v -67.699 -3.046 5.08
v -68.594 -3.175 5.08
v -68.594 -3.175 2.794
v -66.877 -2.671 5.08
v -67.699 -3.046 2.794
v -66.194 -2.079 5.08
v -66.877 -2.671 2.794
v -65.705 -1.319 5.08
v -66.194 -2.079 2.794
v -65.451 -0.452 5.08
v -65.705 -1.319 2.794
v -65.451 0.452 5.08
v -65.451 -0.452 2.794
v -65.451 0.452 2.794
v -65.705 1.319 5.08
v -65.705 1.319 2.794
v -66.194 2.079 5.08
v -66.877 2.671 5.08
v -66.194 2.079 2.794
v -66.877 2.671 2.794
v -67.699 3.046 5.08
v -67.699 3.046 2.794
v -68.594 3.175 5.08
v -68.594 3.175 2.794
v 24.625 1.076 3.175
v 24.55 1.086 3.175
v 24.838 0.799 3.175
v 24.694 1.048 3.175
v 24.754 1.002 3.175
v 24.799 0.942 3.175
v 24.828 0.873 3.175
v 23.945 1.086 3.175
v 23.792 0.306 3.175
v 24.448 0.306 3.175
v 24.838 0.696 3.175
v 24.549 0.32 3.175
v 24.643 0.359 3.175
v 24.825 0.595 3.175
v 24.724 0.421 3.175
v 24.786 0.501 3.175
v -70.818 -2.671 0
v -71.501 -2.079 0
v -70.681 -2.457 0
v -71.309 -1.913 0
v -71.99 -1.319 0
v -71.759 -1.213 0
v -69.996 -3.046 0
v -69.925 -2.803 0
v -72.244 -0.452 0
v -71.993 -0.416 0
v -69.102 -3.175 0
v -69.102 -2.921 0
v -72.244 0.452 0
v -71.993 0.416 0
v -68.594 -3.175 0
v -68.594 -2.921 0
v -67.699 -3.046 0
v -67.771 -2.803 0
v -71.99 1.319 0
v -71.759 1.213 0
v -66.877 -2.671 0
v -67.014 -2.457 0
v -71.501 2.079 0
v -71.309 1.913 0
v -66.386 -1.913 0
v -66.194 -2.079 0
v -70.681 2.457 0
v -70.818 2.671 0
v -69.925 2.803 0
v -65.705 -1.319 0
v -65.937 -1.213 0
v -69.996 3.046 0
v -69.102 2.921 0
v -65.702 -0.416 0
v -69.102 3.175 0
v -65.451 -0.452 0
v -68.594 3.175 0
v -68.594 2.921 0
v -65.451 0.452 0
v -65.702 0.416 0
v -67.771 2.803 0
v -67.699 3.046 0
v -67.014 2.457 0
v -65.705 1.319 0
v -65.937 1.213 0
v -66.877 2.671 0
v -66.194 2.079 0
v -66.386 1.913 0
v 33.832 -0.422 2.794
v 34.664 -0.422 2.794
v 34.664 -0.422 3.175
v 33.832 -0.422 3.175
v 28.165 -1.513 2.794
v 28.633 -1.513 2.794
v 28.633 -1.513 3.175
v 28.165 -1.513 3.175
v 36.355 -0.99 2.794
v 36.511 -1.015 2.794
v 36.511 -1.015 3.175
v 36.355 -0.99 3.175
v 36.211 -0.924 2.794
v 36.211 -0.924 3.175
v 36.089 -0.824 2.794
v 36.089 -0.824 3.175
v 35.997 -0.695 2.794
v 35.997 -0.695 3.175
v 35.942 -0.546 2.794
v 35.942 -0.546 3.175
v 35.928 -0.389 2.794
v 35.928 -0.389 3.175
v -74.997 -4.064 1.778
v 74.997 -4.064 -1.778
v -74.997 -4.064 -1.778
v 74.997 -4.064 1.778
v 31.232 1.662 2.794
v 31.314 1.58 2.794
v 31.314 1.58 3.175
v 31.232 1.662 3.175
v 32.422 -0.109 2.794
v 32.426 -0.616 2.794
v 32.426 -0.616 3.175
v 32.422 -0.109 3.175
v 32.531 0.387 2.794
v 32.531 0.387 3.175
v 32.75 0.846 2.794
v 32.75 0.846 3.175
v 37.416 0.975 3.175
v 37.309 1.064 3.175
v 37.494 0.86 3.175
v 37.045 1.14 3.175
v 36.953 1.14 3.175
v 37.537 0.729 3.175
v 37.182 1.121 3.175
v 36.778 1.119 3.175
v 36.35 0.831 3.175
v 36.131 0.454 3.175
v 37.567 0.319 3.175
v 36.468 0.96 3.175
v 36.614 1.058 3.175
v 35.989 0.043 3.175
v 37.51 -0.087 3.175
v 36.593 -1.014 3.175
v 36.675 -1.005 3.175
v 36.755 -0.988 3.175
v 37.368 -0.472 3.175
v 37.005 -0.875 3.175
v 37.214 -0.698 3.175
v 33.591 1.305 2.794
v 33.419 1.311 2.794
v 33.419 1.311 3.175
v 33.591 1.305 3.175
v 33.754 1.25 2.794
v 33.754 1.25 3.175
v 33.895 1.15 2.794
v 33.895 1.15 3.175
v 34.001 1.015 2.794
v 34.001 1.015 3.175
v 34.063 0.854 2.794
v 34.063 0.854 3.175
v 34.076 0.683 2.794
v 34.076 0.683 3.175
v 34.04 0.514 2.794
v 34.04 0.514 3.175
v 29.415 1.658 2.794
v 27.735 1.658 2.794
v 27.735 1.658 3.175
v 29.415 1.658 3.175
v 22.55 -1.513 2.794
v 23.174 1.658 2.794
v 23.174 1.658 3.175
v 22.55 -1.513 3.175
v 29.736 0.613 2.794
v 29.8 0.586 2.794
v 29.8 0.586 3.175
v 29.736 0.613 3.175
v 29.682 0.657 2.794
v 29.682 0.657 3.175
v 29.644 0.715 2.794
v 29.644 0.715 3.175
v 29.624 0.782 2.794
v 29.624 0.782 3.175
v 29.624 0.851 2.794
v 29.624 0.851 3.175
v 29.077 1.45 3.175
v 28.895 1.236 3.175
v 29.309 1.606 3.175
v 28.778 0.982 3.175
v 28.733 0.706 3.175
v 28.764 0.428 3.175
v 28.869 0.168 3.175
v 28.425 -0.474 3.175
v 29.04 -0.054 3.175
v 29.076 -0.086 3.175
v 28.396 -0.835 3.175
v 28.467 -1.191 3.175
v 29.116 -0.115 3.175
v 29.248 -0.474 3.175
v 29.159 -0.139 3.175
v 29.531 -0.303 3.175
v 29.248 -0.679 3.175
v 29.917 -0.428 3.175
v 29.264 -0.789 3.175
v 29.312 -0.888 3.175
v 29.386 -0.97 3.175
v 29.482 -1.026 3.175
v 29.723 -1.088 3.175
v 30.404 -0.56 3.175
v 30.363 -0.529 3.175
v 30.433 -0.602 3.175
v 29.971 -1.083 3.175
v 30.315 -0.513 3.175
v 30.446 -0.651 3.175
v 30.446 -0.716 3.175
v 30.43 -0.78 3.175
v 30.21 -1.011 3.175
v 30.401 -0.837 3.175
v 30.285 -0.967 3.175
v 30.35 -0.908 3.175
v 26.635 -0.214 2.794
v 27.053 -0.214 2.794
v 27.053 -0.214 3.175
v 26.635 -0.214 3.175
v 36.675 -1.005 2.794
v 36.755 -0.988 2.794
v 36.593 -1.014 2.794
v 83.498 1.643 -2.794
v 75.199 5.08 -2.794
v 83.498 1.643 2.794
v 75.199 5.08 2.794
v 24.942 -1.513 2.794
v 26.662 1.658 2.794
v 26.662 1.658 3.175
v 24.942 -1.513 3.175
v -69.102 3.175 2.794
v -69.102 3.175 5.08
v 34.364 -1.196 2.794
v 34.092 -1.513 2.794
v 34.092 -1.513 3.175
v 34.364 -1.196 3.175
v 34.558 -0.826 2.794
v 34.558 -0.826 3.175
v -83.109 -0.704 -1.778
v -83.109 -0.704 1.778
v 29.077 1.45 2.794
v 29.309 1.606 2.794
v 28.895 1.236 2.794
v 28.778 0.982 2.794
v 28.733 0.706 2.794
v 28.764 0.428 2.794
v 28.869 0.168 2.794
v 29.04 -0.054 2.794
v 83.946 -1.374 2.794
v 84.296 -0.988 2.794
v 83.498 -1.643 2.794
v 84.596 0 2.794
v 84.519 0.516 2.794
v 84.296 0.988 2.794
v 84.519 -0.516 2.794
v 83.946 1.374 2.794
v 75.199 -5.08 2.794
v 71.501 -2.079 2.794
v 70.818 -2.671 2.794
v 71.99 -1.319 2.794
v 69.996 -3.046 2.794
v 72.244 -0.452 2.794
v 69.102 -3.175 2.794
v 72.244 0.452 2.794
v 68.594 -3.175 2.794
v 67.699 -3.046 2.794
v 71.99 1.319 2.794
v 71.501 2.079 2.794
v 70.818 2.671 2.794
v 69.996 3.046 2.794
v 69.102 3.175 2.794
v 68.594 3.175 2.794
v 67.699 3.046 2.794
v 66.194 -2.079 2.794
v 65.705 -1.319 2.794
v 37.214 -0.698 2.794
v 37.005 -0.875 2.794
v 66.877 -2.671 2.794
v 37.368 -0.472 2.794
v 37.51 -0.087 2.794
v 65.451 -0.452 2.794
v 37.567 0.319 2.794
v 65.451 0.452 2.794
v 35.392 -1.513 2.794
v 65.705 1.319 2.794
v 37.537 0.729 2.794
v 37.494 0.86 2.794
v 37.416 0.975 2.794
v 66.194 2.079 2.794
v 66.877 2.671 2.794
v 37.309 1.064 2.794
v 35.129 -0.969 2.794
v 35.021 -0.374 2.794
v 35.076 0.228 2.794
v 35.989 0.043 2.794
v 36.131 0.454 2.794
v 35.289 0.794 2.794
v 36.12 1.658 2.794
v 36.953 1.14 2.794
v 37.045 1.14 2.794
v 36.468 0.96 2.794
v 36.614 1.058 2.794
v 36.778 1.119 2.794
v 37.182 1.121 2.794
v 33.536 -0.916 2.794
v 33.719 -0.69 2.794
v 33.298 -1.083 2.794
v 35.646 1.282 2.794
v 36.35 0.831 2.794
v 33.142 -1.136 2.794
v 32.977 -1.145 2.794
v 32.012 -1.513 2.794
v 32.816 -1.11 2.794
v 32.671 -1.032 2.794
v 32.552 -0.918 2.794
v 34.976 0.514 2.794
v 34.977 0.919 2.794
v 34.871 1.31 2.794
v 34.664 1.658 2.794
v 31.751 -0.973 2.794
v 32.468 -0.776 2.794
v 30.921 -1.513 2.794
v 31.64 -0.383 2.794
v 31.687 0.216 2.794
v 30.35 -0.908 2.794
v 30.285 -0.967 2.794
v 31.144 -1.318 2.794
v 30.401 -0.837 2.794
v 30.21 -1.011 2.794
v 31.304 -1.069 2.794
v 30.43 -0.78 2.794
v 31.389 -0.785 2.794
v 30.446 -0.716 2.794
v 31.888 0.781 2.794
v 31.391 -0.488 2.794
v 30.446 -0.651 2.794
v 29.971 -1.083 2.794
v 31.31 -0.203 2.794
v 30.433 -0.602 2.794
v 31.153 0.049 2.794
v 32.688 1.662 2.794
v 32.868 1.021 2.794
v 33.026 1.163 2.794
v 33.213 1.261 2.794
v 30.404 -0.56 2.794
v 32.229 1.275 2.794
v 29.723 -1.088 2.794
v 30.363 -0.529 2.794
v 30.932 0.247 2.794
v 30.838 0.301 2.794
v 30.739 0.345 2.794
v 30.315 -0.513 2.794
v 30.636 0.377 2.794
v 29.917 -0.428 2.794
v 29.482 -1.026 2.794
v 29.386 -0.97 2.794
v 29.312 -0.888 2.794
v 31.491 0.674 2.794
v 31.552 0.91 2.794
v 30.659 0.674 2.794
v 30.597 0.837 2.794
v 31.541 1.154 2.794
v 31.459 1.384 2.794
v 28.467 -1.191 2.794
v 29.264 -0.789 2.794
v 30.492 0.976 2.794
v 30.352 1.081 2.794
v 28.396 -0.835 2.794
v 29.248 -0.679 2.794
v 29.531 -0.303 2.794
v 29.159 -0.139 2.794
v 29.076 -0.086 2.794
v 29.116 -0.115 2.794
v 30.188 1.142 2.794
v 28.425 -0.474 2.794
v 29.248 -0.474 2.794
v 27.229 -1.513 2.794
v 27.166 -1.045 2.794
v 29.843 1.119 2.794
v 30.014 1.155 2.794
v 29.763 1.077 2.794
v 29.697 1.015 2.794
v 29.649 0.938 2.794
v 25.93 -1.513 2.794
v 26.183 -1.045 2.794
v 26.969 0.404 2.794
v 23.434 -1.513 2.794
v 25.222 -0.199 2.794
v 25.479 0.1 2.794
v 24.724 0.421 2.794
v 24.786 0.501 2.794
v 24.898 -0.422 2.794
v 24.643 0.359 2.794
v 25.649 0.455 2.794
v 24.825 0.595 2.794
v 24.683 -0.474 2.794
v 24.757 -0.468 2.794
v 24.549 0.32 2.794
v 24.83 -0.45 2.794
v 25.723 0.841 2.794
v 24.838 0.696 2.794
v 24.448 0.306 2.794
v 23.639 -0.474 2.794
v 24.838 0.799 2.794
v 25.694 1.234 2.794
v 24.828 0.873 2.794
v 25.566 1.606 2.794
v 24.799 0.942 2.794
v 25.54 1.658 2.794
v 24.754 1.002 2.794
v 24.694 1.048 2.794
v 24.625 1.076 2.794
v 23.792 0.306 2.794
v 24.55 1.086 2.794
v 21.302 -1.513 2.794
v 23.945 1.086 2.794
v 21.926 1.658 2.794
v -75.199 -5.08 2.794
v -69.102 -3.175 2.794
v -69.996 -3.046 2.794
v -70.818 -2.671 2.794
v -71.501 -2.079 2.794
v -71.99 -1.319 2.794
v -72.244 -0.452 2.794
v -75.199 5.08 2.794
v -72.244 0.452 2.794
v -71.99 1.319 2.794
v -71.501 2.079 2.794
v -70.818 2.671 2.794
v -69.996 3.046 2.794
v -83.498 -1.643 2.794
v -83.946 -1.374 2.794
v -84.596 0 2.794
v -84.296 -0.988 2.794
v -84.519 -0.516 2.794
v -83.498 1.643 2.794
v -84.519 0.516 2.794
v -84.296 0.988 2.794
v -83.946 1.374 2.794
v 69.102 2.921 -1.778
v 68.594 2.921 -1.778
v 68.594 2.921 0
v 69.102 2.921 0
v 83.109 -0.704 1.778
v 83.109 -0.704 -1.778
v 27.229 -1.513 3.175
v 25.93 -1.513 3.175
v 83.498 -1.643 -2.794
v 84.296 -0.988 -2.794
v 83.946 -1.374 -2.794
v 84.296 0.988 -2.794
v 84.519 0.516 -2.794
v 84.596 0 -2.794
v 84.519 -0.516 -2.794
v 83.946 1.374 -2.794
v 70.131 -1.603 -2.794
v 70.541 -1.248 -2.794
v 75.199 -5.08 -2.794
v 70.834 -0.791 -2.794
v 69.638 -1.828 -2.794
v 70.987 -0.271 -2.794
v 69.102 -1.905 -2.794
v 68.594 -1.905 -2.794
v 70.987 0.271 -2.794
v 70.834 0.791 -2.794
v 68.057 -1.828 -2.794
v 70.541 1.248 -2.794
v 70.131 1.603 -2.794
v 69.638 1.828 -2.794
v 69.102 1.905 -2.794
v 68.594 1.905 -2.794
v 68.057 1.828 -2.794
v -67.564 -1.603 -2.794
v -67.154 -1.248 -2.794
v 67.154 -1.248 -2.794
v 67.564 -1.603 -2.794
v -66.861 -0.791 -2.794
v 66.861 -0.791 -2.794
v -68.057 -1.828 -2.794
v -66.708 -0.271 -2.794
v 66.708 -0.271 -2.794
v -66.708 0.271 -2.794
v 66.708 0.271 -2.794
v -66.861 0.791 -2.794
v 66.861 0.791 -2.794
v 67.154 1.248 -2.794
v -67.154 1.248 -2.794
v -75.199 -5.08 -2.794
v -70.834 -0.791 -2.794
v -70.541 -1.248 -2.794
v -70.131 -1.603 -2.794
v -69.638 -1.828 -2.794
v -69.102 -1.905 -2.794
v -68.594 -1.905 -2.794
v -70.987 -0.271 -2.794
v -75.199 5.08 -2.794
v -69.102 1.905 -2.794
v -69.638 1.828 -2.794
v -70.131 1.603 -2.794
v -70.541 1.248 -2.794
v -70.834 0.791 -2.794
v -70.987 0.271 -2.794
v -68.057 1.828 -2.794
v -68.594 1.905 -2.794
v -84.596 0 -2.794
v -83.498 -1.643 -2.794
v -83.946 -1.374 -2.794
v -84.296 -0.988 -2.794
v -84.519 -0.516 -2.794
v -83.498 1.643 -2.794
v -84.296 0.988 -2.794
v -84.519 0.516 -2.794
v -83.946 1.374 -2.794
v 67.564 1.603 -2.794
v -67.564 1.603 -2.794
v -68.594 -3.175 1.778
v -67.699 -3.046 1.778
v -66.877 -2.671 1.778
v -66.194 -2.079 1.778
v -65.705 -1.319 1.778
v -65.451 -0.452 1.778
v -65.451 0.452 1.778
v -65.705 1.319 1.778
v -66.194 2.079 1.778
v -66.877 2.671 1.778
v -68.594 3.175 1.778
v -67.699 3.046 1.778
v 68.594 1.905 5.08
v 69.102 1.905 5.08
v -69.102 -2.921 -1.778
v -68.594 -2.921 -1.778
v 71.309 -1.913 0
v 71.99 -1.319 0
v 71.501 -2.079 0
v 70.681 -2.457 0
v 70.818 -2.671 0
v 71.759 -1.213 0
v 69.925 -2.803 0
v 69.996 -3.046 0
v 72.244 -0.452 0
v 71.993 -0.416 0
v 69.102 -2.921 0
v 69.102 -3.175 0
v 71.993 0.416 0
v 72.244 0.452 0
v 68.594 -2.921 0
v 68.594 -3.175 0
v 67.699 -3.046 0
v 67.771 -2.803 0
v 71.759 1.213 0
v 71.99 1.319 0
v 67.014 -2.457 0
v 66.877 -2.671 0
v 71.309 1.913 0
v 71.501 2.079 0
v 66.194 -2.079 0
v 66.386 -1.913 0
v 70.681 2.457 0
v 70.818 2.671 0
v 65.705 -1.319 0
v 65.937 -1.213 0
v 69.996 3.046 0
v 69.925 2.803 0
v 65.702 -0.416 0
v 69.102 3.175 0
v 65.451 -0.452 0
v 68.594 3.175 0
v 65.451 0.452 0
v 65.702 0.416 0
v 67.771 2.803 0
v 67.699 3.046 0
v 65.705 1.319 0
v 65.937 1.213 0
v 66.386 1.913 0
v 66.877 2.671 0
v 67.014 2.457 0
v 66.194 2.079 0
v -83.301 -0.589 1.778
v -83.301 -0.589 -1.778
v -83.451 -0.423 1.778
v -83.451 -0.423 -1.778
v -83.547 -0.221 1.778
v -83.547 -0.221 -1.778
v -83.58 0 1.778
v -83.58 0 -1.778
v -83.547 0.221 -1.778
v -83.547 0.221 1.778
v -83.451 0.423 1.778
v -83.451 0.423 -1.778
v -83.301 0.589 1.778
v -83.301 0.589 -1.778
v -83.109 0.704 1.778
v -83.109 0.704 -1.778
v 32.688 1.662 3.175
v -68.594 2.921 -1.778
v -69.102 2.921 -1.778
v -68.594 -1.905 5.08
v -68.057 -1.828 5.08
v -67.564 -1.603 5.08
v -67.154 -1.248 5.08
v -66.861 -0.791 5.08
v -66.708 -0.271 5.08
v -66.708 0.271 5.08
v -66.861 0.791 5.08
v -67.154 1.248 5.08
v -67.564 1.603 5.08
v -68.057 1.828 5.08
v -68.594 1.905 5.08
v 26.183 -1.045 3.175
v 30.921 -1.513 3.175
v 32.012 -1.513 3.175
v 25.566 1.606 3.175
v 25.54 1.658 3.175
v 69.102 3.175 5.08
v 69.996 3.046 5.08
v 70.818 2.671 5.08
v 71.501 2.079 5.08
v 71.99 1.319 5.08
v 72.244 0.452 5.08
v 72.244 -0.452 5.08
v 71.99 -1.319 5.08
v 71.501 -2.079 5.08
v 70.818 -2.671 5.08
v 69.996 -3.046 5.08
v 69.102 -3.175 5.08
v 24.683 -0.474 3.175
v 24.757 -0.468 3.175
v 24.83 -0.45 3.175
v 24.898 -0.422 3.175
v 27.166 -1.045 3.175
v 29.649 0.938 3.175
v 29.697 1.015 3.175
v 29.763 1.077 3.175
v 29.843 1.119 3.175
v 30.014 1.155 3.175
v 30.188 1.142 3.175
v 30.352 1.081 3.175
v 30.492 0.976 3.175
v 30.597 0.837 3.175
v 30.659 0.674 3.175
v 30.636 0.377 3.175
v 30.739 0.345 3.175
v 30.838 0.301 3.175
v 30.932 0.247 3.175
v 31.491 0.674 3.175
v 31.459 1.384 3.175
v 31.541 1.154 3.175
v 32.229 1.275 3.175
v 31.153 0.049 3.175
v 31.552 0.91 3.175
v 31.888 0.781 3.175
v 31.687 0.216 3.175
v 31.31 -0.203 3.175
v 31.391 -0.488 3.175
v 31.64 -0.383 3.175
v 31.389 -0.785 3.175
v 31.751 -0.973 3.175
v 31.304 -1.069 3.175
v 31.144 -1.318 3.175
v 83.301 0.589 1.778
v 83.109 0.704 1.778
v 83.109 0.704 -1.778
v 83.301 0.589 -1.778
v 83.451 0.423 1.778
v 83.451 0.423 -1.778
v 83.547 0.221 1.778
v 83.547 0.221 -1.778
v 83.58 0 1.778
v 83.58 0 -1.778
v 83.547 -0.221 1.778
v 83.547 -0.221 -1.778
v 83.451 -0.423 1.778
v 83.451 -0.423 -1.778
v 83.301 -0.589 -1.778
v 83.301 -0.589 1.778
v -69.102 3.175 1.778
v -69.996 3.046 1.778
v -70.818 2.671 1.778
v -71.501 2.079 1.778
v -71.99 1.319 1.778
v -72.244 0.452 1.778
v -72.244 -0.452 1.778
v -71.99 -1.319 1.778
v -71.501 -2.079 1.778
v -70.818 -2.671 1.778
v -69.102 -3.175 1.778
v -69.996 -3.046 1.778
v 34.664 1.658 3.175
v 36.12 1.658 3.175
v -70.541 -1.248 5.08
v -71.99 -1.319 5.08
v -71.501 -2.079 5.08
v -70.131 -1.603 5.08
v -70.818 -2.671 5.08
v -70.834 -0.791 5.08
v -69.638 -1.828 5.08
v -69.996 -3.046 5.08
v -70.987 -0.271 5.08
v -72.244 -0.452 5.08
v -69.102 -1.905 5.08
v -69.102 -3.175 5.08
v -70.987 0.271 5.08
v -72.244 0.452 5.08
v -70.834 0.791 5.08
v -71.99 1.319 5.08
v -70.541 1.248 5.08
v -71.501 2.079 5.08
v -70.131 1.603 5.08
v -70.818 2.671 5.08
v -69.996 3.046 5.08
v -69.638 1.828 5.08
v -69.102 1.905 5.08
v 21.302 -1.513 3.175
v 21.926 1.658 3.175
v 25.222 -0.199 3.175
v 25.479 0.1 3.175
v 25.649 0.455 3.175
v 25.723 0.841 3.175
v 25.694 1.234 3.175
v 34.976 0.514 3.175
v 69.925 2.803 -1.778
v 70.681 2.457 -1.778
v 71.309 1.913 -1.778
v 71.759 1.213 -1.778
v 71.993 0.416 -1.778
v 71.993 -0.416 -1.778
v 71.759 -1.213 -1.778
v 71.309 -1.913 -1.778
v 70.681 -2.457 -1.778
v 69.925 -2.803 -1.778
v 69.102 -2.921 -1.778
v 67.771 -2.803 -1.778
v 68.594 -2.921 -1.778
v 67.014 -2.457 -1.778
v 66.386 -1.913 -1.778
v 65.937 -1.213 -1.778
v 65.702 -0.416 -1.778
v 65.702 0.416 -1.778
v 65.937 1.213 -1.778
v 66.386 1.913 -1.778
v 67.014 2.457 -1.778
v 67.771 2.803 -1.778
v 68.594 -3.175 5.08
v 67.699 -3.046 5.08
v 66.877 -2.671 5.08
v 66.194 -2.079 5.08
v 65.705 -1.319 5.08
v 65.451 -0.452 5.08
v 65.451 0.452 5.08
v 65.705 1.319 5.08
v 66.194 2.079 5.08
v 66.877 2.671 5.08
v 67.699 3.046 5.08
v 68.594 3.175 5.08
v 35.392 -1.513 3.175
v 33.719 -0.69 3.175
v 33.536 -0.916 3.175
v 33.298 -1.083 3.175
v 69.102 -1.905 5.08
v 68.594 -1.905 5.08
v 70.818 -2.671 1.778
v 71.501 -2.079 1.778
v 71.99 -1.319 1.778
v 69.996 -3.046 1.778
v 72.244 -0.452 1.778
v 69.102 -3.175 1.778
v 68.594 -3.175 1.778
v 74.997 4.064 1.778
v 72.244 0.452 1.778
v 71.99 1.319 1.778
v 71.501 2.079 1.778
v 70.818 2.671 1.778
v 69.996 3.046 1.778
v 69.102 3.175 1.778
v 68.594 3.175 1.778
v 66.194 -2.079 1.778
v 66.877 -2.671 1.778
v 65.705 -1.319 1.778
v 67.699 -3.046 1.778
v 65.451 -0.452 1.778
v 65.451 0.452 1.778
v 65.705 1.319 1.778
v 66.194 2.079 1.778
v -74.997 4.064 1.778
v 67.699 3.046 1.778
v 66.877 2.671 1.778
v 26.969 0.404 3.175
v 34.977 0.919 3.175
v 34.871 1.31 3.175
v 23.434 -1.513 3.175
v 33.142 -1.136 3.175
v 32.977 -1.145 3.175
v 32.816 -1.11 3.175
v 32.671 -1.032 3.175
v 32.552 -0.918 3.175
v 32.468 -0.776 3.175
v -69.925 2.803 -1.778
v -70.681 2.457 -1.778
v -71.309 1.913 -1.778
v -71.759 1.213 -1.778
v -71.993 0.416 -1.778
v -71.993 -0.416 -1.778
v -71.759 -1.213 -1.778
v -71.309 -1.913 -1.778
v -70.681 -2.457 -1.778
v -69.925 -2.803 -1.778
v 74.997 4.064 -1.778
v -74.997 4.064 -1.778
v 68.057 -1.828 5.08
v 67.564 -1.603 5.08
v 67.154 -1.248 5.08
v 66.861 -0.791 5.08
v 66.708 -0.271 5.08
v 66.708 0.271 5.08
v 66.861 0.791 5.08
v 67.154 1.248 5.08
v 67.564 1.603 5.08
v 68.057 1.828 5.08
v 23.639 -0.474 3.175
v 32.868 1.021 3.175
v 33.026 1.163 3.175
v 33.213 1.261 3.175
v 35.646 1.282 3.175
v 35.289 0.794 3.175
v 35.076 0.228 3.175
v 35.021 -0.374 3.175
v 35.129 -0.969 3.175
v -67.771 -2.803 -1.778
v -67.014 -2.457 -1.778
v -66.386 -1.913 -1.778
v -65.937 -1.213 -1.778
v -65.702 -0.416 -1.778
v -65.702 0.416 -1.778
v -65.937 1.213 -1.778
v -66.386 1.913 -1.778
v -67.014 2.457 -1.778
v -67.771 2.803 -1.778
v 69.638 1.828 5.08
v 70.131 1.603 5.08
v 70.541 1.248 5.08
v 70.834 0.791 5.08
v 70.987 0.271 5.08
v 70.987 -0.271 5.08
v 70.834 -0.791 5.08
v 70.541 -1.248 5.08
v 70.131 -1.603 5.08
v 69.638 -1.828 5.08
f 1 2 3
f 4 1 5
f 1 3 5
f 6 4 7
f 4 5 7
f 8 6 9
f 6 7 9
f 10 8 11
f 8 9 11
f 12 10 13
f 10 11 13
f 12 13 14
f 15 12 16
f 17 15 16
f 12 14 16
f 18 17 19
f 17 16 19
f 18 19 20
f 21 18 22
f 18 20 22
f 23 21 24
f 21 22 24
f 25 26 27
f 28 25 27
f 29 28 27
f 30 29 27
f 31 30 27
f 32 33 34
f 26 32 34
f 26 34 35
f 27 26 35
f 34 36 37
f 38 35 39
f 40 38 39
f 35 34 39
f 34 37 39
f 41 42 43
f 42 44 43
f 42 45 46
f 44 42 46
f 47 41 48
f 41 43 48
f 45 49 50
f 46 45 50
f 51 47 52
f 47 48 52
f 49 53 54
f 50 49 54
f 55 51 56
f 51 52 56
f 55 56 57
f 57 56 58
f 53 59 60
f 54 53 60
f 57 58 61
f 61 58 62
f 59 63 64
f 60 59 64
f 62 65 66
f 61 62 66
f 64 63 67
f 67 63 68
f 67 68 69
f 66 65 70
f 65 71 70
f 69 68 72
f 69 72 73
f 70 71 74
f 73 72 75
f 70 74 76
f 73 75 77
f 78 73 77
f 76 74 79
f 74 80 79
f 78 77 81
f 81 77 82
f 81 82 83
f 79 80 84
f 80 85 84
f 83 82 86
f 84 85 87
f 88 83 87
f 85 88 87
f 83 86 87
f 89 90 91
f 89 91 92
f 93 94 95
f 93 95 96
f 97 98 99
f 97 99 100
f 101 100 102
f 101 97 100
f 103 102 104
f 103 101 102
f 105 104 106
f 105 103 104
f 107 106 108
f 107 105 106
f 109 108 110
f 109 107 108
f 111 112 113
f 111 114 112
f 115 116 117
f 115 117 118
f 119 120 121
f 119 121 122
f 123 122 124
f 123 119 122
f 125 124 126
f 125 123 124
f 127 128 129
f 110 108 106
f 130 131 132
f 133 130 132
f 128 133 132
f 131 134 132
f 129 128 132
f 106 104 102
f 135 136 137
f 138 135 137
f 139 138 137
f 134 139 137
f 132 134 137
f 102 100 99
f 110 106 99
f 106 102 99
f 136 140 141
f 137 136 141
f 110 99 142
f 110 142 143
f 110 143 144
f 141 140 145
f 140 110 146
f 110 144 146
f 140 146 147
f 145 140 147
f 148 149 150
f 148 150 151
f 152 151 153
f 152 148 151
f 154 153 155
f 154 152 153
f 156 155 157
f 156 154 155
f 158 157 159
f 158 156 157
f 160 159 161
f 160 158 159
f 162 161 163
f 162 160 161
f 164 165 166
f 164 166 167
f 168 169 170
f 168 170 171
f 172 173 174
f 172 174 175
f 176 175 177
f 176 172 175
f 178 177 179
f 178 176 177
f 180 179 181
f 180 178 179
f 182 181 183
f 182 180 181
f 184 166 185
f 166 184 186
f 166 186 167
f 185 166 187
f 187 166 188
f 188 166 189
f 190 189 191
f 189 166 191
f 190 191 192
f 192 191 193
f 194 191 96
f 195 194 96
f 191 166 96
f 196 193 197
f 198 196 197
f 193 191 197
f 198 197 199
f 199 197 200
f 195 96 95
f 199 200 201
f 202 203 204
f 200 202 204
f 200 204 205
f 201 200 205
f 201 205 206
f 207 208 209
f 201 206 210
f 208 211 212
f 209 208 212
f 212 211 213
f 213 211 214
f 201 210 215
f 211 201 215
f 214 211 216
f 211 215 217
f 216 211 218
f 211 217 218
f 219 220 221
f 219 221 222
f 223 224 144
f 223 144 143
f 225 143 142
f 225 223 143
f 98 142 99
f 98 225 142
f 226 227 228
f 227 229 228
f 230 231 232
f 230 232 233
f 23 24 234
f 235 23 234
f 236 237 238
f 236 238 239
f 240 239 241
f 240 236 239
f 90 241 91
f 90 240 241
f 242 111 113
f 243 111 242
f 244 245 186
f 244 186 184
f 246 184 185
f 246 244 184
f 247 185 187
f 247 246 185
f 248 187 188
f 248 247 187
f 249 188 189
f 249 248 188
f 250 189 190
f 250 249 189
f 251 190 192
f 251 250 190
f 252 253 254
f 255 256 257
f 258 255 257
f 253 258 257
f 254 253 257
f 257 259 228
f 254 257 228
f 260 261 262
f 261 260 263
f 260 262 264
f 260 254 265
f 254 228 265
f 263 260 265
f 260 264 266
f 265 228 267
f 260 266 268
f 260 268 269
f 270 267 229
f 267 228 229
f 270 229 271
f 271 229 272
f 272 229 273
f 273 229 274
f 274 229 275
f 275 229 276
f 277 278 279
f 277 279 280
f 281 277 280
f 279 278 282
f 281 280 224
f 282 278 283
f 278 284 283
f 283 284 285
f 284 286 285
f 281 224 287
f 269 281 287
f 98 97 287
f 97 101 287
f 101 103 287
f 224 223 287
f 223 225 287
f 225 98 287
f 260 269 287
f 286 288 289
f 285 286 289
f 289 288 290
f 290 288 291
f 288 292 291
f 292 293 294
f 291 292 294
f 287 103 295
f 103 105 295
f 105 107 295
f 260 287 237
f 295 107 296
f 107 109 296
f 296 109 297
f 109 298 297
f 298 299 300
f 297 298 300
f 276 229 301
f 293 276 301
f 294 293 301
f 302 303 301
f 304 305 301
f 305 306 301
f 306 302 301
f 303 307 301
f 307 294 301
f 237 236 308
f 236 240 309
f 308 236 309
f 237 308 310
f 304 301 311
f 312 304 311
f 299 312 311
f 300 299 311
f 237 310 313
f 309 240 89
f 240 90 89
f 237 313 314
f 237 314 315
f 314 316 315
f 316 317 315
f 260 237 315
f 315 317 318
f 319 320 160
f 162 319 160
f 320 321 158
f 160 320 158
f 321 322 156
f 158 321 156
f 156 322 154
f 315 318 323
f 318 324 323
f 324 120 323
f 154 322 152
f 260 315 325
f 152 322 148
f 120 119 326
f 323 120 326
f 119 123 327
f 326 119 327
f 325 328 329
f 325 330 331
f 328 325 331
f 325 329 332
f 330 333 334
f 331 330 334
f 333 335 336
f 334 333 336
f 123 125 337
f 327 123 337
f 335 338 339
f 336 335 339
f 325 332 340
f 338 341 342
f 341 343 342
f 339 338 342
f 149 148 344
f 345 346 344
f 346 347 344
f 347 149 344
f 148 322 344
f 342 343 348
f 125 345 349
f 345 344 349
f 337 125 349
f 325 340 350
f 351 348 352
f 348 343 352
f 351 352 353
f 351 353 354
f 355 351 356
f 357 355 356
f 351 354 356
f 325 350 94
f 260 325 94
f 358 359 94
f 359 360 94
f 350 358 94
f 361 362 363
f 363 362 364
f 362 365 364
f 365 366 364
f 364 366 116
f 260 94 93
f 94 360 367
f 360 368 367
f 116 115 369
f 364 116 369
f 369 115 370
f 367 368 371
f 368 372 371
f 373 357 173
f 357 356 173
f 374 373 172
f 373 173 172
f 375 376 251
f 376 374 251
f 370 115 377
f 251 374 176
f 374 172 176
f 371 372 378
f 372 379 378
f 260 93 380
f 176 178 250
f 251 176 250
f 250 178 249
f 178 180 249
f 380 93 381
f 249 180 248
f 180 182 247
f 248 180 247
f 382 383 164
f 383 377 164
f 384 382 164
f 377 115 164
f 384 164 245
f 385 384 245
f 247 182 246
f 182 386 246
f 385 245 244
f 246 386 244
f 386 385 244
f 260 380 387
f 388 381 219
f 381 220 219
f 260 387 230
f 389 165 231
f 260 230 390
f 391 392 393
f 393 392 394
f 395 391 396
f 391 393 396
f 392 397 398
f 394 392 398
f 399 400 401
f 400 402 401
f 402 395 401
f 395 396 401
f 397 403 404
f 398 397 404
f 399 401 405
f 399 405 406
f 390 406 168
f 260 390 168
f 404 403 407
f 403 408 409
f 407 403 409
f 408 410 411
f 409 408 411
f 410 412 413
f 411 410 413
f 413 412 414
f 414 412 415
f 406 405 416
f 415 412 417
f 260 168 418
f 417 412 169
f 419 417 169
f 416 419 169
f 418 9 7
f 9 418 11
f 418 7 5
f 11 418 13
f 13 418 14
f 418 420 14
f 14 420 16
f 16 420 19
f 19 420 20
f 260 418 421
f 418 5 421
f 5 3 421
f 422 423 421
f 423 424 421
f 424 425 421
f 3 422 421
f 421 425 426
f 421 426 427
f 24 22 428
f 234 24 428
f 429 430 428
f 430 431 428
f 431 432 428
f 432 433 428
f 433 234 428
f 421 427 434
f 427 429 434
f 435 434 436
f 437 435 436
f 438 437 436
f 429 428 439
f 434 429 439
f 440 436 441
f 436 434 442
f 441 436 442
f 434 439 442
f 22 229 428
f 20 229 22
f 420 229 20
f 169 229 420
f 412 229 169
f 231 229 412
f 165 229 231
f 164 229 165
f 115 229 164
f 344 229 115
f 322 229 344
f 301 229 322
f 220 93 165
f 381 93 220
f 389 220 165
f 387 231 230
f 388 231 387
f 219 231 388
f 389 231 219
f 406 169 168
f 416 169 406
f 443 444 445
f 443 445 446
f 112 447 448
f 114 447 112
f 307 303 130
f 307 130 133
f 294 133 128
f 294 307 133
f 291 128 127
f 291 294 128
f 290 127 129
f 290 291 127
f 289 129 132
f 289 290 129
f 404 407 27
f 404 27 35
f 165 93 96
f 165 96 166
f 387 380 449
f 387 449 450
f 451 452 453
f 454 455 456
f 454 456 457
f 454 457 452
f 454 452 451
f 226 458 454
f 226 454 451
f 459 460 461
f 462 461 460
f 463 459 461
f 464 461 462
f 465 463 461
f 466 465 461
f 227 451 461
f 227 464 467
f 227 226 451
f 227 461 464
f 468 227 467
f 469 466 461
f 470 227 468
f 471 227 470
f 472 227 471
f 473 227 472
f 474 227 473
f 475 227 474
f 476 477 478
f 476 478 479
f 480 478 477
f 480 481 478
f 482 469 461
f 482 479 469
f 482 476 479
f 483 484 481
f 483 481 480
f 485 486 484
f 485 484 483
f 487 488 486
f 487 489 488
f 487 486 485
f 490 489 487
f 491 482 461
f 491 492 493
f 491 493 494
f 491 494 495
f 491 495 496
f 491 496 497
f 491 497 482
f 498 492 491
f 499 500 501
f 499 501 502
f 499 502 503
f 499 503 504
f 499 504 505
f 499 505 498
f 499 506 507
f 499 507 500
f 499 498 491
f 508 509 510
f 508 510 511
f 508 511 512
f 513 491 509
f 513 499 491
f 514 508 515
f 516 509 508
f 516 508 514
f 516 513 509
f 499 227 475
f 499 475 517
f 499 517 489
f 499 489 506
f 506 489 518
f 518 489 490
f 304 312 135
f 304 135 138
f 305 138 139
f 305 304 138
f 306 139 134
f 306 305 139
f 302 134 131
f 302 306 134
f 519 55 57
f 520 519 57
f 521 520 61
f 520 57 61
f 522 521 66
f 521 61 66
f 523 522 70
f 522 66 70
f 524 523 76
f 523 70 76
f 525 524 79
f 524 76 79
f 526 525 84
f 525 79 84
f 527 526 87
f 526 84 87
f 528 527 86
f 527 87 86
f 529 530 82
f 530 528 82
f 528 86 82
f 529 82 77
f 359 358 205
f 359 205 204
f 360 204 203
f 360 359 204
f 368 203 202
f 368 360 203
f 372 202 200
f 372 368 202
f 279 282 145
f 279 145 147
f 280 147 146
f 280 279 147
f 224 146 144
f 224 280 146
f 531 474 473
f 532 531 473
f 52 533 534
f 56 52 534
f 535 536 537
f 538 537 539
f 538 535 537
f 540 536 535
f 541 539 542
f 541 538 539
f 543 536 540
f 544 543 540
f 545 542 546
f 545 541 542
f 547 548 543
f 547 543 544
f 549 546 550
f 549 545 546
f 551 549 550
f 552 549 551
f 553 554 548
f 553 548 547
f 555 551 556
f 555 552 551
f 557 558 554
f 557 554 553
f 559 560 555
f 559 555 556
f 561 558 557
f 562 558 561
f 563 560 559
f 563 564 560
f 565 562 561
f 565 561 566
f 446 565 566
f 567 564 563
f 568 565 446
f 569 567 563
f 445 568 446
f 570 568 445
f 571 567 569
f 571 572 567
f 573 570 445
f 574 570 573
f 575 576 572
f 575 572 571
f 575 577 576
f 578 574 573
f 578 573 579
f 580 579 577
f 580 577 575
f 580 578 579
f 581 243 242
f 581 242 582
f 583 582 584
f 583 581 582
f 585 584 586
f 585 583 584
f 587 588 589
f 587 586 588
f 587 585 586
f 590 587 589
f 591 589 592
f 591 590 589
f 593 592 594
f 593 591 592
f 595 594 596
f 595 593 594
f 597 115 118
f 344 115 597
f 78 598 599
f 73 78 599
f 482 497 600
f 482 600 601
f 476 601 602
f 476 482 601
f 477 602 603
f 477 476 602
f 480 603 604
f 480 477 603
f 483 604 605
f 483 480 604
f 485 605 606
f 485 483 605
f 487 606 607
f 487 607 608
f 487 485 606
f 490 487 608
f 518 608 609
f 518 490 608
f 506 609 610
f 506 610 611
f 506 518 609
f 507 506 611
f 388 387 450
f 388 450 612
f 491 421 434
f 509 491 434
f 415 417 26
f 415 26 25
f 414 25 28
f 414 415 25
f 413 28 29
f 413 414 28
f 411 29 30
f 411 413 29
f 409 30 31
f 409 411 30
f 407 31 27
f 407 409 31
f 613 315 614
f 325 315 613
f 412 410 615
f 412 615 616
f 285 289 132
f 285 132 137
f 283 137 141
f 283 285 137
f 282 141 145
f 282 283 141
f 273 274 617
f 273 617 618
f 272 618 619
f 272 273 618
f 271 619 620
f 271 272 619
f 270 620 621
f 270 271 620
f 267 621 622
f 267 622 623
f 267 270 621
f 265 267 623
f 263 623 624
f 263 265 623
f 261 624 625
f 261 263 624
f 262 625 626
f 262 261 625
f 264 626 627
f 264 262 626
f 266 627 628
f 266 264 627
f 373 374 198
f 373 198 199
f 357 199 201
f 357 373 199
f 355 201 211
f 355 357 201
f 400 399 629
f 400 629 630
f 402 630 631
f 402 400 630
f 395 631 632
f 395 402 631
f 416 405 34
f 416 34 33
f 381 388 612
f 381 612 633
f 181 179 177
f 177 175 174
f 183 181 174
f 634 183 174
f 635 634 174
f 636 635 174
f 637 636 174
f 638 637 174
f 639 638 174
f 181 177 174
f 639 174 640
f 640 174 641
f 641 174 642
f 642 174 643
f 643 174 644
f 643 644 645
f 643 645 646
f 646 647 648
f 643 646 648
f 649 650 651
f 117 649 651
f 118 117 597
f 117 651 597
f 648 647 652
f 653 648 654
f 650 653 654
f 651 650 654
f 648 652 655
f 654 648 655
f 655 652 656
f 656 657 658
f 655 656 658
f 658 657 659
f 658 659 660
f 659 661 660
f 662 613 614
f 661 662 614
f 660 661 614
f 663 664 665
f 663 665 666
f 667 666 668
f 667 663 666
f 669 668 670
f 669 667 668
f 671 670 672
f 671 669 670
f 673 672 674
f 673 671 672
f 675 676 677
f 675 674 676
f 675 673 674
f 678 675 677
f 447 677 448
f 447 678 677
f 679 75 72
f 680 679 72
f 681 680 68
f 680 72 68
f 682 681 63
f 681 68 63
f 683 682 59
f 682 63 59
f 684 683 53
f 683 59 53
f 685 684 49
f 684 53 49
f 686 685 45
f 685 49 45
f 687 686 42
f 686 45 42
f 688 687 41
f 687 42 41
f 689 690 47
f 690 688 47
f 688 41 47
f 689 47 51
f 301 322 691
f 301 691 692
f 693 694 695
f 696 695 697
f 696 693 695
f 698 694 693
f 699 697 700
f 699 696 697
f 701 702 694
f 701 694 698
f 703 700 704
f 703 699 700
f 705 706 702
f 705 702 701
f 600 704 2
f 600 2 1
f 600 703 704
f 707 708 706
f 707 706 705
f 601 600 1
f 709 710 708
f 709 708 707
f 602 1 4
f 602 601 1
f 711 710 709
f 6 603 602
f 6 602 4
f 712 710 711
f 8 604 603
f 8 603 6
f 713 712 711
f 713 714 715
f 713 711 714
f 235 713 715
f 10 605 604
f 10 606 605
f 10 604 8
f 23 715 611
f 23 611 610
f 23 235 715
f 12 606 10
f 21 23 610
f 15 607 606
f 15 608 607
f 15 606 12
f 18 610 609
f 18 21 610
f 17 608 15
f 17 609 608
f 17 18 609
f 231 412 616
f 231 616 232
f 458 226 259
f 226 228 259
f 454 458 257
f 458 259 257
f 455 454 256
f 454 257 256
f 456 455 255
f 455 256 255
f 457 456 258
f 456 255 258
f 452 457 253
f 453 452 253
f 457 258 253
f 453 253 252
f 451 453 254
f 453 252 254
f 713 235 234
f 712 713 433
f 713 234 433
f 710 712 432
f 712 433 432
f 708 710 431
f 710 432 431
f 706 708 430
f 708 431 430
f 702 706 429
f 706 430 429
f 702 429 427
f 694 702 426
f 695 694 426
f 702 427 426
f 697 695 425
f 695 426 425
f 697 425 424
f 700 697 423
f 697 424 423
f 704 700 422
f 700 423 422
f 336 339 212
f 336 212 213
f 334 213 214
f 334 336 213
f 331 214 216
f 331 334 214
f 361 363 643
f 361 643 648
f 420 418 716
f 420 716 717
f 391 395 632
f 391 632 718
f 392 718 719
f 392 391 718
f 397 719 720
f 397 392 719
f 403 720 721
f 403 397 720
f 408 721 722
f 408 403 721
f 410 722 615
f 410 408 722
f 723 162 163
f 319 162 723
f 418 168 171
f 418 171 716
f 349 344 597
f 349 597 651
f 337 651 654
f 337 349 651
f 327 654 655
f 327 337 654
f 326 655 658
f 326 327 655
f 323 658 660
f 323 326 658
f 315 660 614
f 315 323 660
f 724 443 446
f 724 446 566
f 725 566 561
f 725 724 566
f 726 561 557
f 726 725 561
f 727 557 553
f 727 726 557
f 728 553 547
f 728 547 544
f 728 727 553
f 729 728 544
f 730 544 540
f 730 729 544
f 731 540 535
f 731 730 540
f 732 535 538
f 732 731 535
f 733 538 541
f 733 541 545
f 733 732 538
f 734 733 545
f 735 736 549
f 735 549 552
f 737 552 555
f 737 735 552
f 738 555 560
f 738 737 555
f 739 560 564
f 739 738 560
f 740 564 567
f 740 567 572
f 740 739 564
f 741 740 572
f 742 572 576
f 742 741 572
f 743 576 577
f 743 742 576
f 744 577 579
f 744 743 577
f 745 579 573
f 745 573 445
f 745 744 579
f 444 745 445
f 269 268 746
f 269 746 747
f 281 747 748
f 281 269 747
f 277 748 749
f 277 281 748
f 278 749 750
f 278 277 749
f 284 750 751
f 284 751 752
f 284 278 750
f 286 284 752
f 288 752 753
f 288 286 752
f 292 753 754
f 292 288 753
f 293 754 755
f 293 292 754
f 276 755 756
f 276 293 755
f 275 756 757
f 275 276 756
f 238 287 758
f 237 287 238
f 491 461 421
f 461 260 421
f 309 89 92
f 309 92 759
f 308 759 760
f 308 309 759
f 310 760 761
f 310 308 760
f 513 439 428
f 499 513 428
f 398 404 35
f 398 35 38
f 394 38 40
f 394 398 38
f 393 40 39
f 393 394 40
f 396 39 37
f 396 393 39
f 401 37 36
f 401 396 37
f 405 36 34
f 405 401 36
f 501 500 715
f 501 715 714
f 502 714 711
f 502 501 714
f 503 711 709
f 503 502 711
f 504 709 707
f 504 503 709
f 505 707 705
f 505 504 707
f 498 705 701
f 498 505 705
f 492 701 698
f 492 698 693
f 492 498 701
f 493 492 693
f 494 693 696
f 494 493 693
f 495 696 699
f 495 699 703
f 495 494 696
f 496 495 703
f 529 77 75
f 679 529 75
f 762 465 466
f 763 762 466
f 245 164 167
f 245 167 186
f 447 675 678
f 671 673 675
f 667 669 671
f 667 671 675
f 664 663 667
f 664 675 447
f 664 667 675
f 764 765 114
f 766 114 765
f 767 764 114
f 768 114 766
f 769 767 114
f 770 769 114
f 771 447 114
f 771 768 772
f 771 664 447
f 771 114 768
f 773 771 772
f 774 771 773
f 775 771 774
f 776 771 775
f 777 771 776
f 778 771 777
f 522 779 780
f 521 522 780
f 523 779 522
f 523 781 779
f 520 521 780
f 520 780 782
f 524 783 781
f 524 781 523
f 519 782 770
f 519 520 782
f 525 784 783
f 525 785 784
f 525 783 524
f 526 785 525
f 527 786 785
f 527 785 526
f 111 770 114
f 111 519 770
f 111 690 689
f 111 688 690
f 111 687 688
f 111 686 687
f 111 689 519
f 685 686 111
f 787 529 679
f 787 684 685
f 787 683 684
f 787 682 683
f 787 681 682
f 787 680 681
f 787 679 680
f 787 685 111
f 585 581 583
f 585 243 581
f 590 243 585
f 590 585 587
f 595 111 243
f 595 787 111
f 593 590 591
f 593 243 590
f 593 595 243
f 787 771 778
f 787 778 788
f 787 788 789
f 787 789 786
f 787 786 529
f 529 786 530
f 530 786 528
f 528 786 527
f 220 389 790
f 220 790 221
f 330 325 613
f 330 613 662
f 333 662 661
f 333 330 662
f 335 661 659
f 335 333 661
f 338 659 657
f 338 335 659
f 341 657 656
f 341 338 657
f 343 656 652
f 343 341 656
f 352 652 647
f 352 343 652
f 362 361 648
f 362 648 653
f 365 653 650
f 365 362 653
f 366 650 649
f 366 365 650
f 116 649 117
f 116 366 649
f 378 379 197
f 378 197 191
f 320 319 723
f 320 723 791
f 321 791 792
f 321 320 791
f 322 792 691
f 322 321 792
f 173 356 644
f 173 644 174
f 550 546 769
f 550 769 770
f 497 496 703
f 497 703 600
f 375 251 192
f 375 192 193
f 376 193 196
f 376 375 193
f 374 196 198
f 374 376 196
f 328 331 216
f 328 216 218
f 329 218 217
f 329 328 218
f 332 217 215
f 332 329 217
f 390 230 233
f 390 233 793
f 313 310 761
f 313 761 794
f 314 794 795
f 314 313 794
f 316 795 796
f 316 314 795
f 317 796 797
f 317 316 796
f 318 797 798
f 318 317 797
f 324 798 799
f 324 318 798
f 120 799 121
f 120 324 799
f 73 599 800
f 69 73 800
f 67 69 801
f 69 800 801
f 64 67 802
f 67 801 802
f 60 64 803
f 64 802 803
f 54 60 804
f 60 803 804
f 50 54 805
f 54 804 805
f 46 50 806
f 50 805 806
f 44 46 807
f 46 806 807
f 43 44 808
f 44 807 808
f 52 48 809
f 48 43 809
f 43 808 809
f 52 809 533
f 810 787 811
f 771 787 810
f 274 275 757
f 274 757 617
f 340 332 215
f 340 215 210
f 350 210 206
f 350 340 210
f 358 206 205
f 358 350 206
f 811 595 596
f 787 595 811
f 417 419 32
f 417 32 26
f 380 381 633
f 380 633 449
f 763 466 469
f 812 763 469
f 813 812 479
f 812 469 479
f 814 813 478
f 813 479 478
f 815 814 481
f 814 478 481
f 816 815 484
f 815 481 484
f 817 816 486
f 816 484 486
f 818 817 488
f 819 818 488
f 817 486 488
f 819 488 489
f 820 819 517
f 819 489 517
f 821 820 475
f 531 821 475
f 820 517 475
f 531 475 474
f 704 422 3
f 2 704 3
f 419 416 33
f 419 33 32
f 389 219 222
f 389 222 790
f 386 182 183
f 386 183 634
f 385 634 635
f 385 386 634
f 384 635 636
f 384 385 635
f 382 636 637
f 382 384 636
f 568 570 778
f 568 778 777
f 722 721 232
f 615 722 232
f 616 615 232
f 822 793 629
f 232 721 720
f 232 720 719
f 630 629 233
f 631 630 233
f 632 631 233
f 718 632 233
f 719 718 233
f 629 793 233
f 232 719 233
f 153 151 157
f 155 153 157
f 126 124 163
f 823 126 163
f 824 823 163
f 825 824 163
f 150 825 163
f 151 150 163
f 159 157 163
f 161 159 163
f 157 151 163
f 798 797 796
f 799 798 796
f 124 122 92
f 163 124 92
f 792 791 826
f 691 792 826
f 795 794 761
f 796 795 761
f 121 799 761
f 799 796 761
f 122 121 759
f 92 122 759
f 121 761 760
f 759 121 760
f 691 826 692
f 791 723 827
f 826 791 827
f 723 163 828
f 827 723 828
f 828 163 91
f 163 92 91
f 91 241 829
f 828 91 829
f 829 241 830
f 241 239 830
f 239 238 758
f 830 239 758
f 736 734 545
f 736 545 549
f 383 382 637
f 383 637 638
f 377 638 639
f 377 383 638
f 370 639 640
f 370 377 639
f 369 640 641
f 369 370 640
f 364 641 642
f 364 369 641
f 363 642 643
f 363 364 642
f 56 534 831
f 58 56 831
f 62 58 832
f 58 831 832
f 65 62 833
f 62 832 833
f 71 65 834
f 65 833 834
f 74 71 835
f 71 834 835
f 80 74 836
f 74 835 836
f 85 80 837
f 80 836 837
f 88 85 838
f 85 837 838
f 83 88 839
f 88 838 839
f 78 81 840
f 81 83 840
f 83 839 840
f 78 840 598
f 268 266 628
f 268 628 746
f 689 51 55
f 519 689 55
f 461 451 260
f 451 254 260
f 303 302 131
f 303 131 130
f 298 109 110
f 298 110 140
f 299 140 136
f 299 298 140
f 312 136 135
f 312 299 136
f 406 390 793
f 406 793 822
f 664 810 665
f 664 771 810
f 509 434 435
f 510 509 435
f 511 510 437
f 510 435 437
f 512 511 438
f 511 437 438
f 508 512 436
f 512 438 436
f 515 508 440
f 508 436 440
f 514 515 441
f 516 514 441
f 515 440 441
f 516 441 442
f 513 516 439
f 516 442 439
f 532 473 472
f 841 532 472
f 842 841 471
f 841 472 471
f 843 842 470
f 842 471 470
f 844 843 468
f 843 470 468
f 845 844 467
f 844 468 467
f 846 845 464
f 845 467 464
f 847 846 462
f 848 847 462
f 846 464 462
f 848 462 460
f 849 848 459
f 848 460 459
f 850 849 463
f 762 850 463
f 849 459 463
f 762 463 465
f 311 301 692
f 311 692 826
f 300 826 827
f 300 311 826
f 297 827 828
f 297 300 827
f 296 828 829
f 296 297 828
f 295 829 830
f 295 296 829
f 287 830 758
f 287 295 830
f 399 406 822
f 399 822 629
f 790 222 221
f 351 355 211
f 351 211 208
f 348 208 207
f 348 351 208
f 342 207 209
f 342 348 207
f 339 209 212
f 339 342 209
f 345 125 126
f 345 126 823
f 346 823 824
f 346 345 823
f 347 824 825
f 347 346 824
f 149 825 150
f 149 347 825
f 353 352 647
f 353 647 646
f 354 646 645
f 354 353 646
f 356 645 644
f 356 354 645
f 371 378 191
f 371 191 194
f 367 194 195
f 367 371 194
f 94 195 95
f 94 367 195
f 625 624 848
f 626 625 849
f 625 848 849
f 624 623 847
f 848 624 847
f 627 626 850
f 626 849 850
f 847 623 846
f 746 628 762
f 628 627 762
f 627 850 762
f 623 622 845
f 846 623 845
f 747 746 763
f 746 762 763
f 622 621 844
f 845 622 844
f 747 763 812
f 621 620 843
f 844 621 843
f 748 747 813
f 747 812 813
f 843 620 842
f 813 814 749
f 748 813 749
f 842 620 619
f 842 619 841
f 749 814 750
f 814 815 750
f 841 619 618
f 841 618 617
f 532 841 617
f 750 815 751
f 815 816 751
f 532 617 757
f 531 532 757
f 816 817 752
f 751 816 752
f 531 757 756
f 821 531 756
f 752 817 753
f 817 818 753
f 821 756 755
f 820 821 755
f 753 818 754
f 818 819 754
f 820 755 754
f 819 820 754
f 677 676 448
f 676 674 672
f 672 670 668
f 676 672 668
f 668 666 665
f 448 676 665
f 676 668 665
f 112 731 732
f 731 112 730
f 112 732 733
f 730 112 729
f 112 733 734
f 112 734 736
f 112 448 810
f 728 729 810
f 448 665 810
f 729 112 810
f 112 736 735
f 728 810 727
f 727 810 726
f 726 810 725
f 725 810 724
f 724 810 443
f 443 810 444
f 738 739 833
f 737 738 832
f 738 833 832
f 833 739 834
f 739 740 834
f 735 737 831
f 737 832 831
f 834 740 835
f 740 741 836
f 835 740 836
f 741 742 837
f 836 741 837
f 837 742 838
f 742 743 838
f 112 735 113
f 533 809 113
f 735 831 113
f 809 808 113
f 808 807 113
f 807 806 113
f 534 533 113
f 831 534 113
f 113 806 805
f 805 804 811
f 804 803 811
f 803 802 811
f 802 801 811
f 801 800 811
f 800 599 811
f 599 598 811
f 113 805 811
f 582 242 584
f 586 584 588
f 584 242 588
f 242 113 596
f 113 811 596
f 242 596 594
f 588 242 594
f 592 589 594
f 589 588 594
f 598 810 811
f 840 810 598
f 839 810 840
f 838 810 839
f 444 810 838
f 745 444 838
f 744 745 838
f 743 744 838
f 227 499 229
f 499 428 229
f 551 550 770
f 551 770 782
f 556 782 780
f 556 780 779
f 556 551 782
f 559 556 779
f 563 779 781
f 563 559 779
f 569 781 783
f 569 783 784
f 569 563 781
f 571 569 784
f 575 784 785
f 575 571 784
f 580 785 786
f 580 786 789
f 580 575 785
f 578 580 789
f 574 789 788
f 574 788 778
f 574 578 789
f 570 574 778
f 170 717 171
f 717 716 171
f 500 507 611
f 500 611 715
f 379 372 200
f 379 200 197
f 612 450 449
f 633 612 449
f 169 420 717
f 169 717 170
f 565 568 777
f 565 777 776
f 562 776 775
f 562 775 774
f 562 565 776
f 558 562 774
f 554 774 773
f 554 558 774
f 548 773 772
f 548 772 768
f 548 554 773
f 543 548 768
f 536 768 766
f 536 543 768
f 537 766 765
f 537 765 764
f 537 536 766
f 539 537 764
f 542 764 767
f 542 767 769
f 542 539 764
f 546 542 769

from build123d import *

# Parameters (mm, degrees)
EXTRUDE1_DEPTH      = 2.794
CUT_EXTRUDE1_DEPTH  = 6.588
SHELL2_T            = 1.016
BOSS_EXTRUDE1_DEPTH = 5.08
BOSS_EXTRUDE2_DEPTH = 0.381


with BuildPart() as part:
    # Sketch1 → Extrude1 (new body, symmetric)
    with BuildSketch(Plane.XY):
        with BuildLine():
            Line((-83.497972353, 1.642657809), (-75.199494217, 5.08))
            Line((-75.199494217, 5.08), (75.199494217, 5.08))
            Line((75.199494217, 5.08), (83.497972353, 1.642657809))
            ThreePointArc((83.497972353, 1.642657809), (84.595561211, 0), (83.497972353, -1.642657809))
            Line((83.497972353, -1.642657809), (75.199494217, -5.08))
            Line((75.199494217, -5.08), (-75.199494217, -5.08))
            Line((-75.199494217, -5.08), (-83.497972353, -1.642657809))
            ThreePointArc((-83.497972353, -1.642657809), (-84.595561211, 0), (-83.497972353, 1.642657809))
        make_face()
    extrude(amount=EXTRUDE1_DEPTH, both=True)

    # Sketch7 → Cut-Extrude1 (cut, through all)
    with BuildSketch(Plane.XY.offset(-2.794)):
        with BuildLine():
            Line((-69.101561211, -1.905), (-68.593561211, -1.905))
            ThreePointArc((-68.593561211, -1.905), (-66.688561211, 0), (-68.593561211, 1.905))
            Line((-68.593561211, 1.905), (-69.101561211, 1.905))
            ThreePointArc((-69.101561211, 1.905), (-71.006561211, 0), (-69.101561211, -1.905))
        make_face()
        with BuildLine():
            Line((69.101561211, -1.905), (68.593561211, -1.905))
            ThreePointArc((68.593561211, -1.905), (66.688561211, 0), (68.593561211, 1.905))
            Line((68.593561211, 1.905), (69.101561211, 1.905))
            ThreePointArc((69.101561211, 1.905), (71.006561211, 0), (69.101561211, -1.905))
        make_face()
    extrude(amount=CUT_EXTRUDE1_DEPTH, mode=Mode.SUBTRACT)

    # Shell2 (no face opened: a closed hollow body)
    add(offset(amount=-SHELL2_T, mode=Mode.PRIVATE), mode=Mode.SUBTRACT)

    # Sketch16 → Boss-Extrude1 (add)
    with BuildSketch(Plane.XY):
        with BuildLine():
            Line((-68.593561211, 3.175), (-69.101561211, 3.175))
            ThreePointArc((-69.101561211, 3.175), (-72.276561211, 0), (-69.101561211, -3.175))
            Line((-69.101561211, -3.175), (-68.593561211, -3.175))
            ThreePointArc((-68.593561211, -3.175), (-65.418561211, 0), (-68.593561211, 3.175))
        make_face()
        with BuildLine():
            Line((-68.593561211, 1.905), (-69.101561211, 1.905))
            ThreePointArc((-69.101561211, 1.905), (-71.006561211, 0), (-69.101561211, -1.905))
            Line((-69.101561211, -1.905), (-68.593561211, -1.905))
            ThreePointArc((-68.593561211, -1.905), (-66.688561211, 0), (-68.593561211, 1.905))
        make_face(mode=Mode.SUBTRACT)
        with BuildLine():
            Line((69.101561211, -3.175), (68.593561211, -3.175))
            ThreePointArc((68.593561211, -3.175), (65.418561211, 0), (68.593561211, 3.175))
            Line((68.593561211, 3.175), (69.101561211, 3.175))
            ThreePointArc((69.101561211, 3.175), (72.276561211, 0), (69.101561211, -3.175))
        make_face()
        with BuildLine():
            Line((69.101561211, -1.905), (68.593561211, -1.905))
            ThreePointArc((68.593561211, -1.905), (66.688561211, 0), (68.593561211, 1.905))
            Line((68.593561211, 1.905), (69.101561211, 1.905))
            ThreePointArc((69.101561211, 1.905), (71.006561211, 0), (69.101561211, -1.905))
        make_face(mode=Mode.SUBTRACT)
    extrude(amount=BOSS_EXTRUDE1_DEPTH)

    # Sketch15 → Boss-Extrude2 (add)
    with BuildSketch(Plane(origin=(52.759975214, 8.567310029, 2.794), x_dir=(-1, 0, 0), z_dir=(0, 0, 1))):
        Polygon((30.833634894, 6.909260745), (29.58586719, 6.909260745), (30.209751042, 10.080670326), (31.457518746, 10.080670326), align=None)
        with BuildLine():
            Line((26.098109724, 6.909260745), (27.818196276, 10.080670326))
            Line((27.818196276, 10.080670326), (29.325915585, 10.080670326))
            Line((29.325915585, 10.080670326), (29.121363503, 9.040863906))
            Line((29.121363503, 9.040863906), (28.076751324, 9.040863906))
            ThreePointArc((28.076751324, 9.040863906), (27.966243867, 9.027758301), (27.861867206, 8.989168567))
            ThreePointArc((27.861867206, 8.989168567), (27.110933968, 8.112530186), (27.194312424, 6.961251066))
            Line((27.194312424, 6.961251066), (27.220239704, 6.909260745))
            Line((27.220239704, 6.909260745), (26.098109724, 6.909260745))
        make_face()
        with BuildLine():
            Line((24.594796374, 10.080670326), (25.024818012, 6.909260745))
            Line((25.024818012, 6.909260745), (23.345351563, 6.909260745))
            Line((23.345351563, 6.909260745), (23.451009312, 6.961251066))
            ThreePointArc((23.451009312, 6.961251066), (24.013843502, 7.721578938), (23.720459983, 8.620915865))
            ThreePointArc((23.720459983, 8.620915865), (23.664057171, 8.668518488), (23.600928958, 8.706756109))
            ThreePointArc((23.600928958, 8.706756109), (23.03751713, 8.93797936), (22.445309842, 9.080062458))
            ThreePointArc((22.445309842, 9.080062458), (22.355999269, 9.127094259), (22.313587173, 9.218688925))
            ThreePointArc((22.313587173, 9.218688925), (22.320050836, 9.315750612), (22.359212571, 9.404796153))
            ThreePointArc((22.359212571, 9.404796153), (22.441078376, 9.50688825), (22.550436966, 9.578759697))
            ThreePointArc((22.550436966, 9.578759697), (22.912840286, 9.660745811), (23.278270345, 9.593524078))
            ThreePointArc((23.278270345, 9.593524078), (23.448349032, 9.45576593), (23.512332705, 9.246457171))
            Line((23.512332705, 9.246457171), (23.512332705, 9.040863906))
            Line((23.512332705, 9.040863906), (24.334844769, 9.040863906))
            ThreePointArc((24.334844769, 9.040863906), (24.341195101, 9.582833311), (24.126883485, 10.080670326))
            Line((24.126883485, 10.080670326), (24.594796374, 10.080670326))
        make_face()
        with BuildLine():
            Line((28.312104326, 8.261009091), (28.967949441, 8.261009091))
            Line((28.967949441, 8.261009091), (28.814535379, 7.481154276))
            Line((28.814535379, 7.481154276), (28.209554826, 7.481154276))
            ThreePointArc((28.209554826, 7.481154276), (28.006347959, 7.565325317), (27.922176918, 7.768532184))
            Line((27.922176918, 7.768532184), (27.922176918, 7.871081684))
            ThreePointArc((27.922176918, 7.871081684), (28.036384012, 8.146801998), (28.312104326, 8.261009091))
        make_face()
        Polygon((25.790573757, 8.16352724), (25.706860528, 8.780912301), (26.125426672, 8.780912301), align=None)
        Polygon((25.530622152, 10.080670326), (26.830380177, 10.080670326), (26.576596915, 9.612757437), (25.594067968, 9.612757437), align=None)
        with BuildLine():
            Line((21.446019985, 6.986900983), (21.527856602, 6.905064366))
            Line((21.527856602, 6.905064366), (20.072127614, 6.905064366))
            ThreePointArc((20.072127614, 6.905064366), (21.073440916, 8.351729074), (20.74751262, 10.080670326))
            Line((20.74751262, 10.080670326), (21.839309361, 10.080670326))
            ThreePointArc((21.839309361, 10.080670326), (21.359771514, 9.203641008), (21.828371735, 8.320719265))
            ThreePointArc((21.828371735, 8.320719265), (21.970498458, 8.242561464), (22.123897961, 8.189861942))
            Line((22.123897961, 8.189861942), (22.959965448, 7.98084507))
            ThreePointArc((22.959965448, 7.98084507), (23.09929103, 7.88260745), (23.136218517, 7.716178461))
            ThreePointArc((23.136218517, 7.716178461), (23.063353728, 7.552354455), (22.917107557, 7.44862577))
            ThreePointArc((22.917107557, 7.44862577), (22.408346515, 7.486786133), (22.100511774, 7.893642107))
            Line((22.100511774, 7.893642107), (21.268666638, 7.893642107))
            ThreePointArc((21.268666638, 7.893642107), (21.219023851, 7.413217054), (21.446019985, 6.986900983))
        make_face()
        with BuildLine():
            Line((18.096006249, 6.909260745), (16.640277261, 6.909260745))
            ThreePointArc((16.640277261, 6.909260745), (17.684029363, 8.338941307), (17.368141755, 10.080670326))
            Line((17.368141755, 10.080670326), (18.66789978, 10.080670326))
            ThreePointArc((18.66789978, 10.080670326), (18.288993246, 9.583465168), (18.096006249, 8.988873585))
            Line((18.096006249, 8.988873585), (18.927851385, 8.988873585))
            ThreePointArc((18.927851385, 8.988873585), (19.124730401, 9.376543005), (19.462251482, 9.650638693))
            ThreePointArc((19.462251482, 9.650638693), (20.018996521, 9.643076799), (20.333746509, 9.183778785))
            ThreePointArc((20.333746509, 9.183778785), (20.297634521, 8.424922889), (20.010357156, 7.72161779))
            ThreePointArc((20.010357156, 7.72161779), (19.734264238, 7.404457918), (19.340648899, 7.256523307))
            ThreePointArc((19.340648899, 7.256523307), (18.807293319, 7.48101259), (18.719890101, 8.053047807))
            Line((18.719890101, 8.053047807), (17.784064323, 8.053047807))
            ThreePointArc((17.784064323, 8.053047807), (17.822649734, 7.449140035), (18.096006249, 6.909260745))
        make_face()
        with BuildLine():
            Line((15.807268249, 7.427425154), (15.715290544, 7.427425154))
            ThreePointArc((15.715290544, 7.427425154), (15.394442736, 7.543776842), (15.22275385, 7.838741175))
            ThreePointArc((15.22275385, 7.838741175), (15.210743896, 8.452467568), (15.392018164, 9.038934928))
            ThreePointArc((15.392018164, 9.038934928), (15.644599766, 9.361161911), (16.00483435, 9.555735132))
            ThreePointArc((16.00483435, 9.555735132), (16.126082831, 9.577672377), (16.249203287, 9.582549899))
            ThreePointArc((16.249203287, 9.582549899), (16.671437038, 9.390945472), (16.831737964, 8.95586248))
            ThreePointArc((16.831737964, 8.95586248), (16.709931987, 8.31539524), (16.410014233, 7.736530556))
            ThreePointArc((16.410014233, 7.736530556), (16.145960171, 7.509207095), (15.807268249, 7.427425154))
        make_face()
    extrude(amount=BOSS_EXTRUDE2_DEPTH)


solid = part.part
